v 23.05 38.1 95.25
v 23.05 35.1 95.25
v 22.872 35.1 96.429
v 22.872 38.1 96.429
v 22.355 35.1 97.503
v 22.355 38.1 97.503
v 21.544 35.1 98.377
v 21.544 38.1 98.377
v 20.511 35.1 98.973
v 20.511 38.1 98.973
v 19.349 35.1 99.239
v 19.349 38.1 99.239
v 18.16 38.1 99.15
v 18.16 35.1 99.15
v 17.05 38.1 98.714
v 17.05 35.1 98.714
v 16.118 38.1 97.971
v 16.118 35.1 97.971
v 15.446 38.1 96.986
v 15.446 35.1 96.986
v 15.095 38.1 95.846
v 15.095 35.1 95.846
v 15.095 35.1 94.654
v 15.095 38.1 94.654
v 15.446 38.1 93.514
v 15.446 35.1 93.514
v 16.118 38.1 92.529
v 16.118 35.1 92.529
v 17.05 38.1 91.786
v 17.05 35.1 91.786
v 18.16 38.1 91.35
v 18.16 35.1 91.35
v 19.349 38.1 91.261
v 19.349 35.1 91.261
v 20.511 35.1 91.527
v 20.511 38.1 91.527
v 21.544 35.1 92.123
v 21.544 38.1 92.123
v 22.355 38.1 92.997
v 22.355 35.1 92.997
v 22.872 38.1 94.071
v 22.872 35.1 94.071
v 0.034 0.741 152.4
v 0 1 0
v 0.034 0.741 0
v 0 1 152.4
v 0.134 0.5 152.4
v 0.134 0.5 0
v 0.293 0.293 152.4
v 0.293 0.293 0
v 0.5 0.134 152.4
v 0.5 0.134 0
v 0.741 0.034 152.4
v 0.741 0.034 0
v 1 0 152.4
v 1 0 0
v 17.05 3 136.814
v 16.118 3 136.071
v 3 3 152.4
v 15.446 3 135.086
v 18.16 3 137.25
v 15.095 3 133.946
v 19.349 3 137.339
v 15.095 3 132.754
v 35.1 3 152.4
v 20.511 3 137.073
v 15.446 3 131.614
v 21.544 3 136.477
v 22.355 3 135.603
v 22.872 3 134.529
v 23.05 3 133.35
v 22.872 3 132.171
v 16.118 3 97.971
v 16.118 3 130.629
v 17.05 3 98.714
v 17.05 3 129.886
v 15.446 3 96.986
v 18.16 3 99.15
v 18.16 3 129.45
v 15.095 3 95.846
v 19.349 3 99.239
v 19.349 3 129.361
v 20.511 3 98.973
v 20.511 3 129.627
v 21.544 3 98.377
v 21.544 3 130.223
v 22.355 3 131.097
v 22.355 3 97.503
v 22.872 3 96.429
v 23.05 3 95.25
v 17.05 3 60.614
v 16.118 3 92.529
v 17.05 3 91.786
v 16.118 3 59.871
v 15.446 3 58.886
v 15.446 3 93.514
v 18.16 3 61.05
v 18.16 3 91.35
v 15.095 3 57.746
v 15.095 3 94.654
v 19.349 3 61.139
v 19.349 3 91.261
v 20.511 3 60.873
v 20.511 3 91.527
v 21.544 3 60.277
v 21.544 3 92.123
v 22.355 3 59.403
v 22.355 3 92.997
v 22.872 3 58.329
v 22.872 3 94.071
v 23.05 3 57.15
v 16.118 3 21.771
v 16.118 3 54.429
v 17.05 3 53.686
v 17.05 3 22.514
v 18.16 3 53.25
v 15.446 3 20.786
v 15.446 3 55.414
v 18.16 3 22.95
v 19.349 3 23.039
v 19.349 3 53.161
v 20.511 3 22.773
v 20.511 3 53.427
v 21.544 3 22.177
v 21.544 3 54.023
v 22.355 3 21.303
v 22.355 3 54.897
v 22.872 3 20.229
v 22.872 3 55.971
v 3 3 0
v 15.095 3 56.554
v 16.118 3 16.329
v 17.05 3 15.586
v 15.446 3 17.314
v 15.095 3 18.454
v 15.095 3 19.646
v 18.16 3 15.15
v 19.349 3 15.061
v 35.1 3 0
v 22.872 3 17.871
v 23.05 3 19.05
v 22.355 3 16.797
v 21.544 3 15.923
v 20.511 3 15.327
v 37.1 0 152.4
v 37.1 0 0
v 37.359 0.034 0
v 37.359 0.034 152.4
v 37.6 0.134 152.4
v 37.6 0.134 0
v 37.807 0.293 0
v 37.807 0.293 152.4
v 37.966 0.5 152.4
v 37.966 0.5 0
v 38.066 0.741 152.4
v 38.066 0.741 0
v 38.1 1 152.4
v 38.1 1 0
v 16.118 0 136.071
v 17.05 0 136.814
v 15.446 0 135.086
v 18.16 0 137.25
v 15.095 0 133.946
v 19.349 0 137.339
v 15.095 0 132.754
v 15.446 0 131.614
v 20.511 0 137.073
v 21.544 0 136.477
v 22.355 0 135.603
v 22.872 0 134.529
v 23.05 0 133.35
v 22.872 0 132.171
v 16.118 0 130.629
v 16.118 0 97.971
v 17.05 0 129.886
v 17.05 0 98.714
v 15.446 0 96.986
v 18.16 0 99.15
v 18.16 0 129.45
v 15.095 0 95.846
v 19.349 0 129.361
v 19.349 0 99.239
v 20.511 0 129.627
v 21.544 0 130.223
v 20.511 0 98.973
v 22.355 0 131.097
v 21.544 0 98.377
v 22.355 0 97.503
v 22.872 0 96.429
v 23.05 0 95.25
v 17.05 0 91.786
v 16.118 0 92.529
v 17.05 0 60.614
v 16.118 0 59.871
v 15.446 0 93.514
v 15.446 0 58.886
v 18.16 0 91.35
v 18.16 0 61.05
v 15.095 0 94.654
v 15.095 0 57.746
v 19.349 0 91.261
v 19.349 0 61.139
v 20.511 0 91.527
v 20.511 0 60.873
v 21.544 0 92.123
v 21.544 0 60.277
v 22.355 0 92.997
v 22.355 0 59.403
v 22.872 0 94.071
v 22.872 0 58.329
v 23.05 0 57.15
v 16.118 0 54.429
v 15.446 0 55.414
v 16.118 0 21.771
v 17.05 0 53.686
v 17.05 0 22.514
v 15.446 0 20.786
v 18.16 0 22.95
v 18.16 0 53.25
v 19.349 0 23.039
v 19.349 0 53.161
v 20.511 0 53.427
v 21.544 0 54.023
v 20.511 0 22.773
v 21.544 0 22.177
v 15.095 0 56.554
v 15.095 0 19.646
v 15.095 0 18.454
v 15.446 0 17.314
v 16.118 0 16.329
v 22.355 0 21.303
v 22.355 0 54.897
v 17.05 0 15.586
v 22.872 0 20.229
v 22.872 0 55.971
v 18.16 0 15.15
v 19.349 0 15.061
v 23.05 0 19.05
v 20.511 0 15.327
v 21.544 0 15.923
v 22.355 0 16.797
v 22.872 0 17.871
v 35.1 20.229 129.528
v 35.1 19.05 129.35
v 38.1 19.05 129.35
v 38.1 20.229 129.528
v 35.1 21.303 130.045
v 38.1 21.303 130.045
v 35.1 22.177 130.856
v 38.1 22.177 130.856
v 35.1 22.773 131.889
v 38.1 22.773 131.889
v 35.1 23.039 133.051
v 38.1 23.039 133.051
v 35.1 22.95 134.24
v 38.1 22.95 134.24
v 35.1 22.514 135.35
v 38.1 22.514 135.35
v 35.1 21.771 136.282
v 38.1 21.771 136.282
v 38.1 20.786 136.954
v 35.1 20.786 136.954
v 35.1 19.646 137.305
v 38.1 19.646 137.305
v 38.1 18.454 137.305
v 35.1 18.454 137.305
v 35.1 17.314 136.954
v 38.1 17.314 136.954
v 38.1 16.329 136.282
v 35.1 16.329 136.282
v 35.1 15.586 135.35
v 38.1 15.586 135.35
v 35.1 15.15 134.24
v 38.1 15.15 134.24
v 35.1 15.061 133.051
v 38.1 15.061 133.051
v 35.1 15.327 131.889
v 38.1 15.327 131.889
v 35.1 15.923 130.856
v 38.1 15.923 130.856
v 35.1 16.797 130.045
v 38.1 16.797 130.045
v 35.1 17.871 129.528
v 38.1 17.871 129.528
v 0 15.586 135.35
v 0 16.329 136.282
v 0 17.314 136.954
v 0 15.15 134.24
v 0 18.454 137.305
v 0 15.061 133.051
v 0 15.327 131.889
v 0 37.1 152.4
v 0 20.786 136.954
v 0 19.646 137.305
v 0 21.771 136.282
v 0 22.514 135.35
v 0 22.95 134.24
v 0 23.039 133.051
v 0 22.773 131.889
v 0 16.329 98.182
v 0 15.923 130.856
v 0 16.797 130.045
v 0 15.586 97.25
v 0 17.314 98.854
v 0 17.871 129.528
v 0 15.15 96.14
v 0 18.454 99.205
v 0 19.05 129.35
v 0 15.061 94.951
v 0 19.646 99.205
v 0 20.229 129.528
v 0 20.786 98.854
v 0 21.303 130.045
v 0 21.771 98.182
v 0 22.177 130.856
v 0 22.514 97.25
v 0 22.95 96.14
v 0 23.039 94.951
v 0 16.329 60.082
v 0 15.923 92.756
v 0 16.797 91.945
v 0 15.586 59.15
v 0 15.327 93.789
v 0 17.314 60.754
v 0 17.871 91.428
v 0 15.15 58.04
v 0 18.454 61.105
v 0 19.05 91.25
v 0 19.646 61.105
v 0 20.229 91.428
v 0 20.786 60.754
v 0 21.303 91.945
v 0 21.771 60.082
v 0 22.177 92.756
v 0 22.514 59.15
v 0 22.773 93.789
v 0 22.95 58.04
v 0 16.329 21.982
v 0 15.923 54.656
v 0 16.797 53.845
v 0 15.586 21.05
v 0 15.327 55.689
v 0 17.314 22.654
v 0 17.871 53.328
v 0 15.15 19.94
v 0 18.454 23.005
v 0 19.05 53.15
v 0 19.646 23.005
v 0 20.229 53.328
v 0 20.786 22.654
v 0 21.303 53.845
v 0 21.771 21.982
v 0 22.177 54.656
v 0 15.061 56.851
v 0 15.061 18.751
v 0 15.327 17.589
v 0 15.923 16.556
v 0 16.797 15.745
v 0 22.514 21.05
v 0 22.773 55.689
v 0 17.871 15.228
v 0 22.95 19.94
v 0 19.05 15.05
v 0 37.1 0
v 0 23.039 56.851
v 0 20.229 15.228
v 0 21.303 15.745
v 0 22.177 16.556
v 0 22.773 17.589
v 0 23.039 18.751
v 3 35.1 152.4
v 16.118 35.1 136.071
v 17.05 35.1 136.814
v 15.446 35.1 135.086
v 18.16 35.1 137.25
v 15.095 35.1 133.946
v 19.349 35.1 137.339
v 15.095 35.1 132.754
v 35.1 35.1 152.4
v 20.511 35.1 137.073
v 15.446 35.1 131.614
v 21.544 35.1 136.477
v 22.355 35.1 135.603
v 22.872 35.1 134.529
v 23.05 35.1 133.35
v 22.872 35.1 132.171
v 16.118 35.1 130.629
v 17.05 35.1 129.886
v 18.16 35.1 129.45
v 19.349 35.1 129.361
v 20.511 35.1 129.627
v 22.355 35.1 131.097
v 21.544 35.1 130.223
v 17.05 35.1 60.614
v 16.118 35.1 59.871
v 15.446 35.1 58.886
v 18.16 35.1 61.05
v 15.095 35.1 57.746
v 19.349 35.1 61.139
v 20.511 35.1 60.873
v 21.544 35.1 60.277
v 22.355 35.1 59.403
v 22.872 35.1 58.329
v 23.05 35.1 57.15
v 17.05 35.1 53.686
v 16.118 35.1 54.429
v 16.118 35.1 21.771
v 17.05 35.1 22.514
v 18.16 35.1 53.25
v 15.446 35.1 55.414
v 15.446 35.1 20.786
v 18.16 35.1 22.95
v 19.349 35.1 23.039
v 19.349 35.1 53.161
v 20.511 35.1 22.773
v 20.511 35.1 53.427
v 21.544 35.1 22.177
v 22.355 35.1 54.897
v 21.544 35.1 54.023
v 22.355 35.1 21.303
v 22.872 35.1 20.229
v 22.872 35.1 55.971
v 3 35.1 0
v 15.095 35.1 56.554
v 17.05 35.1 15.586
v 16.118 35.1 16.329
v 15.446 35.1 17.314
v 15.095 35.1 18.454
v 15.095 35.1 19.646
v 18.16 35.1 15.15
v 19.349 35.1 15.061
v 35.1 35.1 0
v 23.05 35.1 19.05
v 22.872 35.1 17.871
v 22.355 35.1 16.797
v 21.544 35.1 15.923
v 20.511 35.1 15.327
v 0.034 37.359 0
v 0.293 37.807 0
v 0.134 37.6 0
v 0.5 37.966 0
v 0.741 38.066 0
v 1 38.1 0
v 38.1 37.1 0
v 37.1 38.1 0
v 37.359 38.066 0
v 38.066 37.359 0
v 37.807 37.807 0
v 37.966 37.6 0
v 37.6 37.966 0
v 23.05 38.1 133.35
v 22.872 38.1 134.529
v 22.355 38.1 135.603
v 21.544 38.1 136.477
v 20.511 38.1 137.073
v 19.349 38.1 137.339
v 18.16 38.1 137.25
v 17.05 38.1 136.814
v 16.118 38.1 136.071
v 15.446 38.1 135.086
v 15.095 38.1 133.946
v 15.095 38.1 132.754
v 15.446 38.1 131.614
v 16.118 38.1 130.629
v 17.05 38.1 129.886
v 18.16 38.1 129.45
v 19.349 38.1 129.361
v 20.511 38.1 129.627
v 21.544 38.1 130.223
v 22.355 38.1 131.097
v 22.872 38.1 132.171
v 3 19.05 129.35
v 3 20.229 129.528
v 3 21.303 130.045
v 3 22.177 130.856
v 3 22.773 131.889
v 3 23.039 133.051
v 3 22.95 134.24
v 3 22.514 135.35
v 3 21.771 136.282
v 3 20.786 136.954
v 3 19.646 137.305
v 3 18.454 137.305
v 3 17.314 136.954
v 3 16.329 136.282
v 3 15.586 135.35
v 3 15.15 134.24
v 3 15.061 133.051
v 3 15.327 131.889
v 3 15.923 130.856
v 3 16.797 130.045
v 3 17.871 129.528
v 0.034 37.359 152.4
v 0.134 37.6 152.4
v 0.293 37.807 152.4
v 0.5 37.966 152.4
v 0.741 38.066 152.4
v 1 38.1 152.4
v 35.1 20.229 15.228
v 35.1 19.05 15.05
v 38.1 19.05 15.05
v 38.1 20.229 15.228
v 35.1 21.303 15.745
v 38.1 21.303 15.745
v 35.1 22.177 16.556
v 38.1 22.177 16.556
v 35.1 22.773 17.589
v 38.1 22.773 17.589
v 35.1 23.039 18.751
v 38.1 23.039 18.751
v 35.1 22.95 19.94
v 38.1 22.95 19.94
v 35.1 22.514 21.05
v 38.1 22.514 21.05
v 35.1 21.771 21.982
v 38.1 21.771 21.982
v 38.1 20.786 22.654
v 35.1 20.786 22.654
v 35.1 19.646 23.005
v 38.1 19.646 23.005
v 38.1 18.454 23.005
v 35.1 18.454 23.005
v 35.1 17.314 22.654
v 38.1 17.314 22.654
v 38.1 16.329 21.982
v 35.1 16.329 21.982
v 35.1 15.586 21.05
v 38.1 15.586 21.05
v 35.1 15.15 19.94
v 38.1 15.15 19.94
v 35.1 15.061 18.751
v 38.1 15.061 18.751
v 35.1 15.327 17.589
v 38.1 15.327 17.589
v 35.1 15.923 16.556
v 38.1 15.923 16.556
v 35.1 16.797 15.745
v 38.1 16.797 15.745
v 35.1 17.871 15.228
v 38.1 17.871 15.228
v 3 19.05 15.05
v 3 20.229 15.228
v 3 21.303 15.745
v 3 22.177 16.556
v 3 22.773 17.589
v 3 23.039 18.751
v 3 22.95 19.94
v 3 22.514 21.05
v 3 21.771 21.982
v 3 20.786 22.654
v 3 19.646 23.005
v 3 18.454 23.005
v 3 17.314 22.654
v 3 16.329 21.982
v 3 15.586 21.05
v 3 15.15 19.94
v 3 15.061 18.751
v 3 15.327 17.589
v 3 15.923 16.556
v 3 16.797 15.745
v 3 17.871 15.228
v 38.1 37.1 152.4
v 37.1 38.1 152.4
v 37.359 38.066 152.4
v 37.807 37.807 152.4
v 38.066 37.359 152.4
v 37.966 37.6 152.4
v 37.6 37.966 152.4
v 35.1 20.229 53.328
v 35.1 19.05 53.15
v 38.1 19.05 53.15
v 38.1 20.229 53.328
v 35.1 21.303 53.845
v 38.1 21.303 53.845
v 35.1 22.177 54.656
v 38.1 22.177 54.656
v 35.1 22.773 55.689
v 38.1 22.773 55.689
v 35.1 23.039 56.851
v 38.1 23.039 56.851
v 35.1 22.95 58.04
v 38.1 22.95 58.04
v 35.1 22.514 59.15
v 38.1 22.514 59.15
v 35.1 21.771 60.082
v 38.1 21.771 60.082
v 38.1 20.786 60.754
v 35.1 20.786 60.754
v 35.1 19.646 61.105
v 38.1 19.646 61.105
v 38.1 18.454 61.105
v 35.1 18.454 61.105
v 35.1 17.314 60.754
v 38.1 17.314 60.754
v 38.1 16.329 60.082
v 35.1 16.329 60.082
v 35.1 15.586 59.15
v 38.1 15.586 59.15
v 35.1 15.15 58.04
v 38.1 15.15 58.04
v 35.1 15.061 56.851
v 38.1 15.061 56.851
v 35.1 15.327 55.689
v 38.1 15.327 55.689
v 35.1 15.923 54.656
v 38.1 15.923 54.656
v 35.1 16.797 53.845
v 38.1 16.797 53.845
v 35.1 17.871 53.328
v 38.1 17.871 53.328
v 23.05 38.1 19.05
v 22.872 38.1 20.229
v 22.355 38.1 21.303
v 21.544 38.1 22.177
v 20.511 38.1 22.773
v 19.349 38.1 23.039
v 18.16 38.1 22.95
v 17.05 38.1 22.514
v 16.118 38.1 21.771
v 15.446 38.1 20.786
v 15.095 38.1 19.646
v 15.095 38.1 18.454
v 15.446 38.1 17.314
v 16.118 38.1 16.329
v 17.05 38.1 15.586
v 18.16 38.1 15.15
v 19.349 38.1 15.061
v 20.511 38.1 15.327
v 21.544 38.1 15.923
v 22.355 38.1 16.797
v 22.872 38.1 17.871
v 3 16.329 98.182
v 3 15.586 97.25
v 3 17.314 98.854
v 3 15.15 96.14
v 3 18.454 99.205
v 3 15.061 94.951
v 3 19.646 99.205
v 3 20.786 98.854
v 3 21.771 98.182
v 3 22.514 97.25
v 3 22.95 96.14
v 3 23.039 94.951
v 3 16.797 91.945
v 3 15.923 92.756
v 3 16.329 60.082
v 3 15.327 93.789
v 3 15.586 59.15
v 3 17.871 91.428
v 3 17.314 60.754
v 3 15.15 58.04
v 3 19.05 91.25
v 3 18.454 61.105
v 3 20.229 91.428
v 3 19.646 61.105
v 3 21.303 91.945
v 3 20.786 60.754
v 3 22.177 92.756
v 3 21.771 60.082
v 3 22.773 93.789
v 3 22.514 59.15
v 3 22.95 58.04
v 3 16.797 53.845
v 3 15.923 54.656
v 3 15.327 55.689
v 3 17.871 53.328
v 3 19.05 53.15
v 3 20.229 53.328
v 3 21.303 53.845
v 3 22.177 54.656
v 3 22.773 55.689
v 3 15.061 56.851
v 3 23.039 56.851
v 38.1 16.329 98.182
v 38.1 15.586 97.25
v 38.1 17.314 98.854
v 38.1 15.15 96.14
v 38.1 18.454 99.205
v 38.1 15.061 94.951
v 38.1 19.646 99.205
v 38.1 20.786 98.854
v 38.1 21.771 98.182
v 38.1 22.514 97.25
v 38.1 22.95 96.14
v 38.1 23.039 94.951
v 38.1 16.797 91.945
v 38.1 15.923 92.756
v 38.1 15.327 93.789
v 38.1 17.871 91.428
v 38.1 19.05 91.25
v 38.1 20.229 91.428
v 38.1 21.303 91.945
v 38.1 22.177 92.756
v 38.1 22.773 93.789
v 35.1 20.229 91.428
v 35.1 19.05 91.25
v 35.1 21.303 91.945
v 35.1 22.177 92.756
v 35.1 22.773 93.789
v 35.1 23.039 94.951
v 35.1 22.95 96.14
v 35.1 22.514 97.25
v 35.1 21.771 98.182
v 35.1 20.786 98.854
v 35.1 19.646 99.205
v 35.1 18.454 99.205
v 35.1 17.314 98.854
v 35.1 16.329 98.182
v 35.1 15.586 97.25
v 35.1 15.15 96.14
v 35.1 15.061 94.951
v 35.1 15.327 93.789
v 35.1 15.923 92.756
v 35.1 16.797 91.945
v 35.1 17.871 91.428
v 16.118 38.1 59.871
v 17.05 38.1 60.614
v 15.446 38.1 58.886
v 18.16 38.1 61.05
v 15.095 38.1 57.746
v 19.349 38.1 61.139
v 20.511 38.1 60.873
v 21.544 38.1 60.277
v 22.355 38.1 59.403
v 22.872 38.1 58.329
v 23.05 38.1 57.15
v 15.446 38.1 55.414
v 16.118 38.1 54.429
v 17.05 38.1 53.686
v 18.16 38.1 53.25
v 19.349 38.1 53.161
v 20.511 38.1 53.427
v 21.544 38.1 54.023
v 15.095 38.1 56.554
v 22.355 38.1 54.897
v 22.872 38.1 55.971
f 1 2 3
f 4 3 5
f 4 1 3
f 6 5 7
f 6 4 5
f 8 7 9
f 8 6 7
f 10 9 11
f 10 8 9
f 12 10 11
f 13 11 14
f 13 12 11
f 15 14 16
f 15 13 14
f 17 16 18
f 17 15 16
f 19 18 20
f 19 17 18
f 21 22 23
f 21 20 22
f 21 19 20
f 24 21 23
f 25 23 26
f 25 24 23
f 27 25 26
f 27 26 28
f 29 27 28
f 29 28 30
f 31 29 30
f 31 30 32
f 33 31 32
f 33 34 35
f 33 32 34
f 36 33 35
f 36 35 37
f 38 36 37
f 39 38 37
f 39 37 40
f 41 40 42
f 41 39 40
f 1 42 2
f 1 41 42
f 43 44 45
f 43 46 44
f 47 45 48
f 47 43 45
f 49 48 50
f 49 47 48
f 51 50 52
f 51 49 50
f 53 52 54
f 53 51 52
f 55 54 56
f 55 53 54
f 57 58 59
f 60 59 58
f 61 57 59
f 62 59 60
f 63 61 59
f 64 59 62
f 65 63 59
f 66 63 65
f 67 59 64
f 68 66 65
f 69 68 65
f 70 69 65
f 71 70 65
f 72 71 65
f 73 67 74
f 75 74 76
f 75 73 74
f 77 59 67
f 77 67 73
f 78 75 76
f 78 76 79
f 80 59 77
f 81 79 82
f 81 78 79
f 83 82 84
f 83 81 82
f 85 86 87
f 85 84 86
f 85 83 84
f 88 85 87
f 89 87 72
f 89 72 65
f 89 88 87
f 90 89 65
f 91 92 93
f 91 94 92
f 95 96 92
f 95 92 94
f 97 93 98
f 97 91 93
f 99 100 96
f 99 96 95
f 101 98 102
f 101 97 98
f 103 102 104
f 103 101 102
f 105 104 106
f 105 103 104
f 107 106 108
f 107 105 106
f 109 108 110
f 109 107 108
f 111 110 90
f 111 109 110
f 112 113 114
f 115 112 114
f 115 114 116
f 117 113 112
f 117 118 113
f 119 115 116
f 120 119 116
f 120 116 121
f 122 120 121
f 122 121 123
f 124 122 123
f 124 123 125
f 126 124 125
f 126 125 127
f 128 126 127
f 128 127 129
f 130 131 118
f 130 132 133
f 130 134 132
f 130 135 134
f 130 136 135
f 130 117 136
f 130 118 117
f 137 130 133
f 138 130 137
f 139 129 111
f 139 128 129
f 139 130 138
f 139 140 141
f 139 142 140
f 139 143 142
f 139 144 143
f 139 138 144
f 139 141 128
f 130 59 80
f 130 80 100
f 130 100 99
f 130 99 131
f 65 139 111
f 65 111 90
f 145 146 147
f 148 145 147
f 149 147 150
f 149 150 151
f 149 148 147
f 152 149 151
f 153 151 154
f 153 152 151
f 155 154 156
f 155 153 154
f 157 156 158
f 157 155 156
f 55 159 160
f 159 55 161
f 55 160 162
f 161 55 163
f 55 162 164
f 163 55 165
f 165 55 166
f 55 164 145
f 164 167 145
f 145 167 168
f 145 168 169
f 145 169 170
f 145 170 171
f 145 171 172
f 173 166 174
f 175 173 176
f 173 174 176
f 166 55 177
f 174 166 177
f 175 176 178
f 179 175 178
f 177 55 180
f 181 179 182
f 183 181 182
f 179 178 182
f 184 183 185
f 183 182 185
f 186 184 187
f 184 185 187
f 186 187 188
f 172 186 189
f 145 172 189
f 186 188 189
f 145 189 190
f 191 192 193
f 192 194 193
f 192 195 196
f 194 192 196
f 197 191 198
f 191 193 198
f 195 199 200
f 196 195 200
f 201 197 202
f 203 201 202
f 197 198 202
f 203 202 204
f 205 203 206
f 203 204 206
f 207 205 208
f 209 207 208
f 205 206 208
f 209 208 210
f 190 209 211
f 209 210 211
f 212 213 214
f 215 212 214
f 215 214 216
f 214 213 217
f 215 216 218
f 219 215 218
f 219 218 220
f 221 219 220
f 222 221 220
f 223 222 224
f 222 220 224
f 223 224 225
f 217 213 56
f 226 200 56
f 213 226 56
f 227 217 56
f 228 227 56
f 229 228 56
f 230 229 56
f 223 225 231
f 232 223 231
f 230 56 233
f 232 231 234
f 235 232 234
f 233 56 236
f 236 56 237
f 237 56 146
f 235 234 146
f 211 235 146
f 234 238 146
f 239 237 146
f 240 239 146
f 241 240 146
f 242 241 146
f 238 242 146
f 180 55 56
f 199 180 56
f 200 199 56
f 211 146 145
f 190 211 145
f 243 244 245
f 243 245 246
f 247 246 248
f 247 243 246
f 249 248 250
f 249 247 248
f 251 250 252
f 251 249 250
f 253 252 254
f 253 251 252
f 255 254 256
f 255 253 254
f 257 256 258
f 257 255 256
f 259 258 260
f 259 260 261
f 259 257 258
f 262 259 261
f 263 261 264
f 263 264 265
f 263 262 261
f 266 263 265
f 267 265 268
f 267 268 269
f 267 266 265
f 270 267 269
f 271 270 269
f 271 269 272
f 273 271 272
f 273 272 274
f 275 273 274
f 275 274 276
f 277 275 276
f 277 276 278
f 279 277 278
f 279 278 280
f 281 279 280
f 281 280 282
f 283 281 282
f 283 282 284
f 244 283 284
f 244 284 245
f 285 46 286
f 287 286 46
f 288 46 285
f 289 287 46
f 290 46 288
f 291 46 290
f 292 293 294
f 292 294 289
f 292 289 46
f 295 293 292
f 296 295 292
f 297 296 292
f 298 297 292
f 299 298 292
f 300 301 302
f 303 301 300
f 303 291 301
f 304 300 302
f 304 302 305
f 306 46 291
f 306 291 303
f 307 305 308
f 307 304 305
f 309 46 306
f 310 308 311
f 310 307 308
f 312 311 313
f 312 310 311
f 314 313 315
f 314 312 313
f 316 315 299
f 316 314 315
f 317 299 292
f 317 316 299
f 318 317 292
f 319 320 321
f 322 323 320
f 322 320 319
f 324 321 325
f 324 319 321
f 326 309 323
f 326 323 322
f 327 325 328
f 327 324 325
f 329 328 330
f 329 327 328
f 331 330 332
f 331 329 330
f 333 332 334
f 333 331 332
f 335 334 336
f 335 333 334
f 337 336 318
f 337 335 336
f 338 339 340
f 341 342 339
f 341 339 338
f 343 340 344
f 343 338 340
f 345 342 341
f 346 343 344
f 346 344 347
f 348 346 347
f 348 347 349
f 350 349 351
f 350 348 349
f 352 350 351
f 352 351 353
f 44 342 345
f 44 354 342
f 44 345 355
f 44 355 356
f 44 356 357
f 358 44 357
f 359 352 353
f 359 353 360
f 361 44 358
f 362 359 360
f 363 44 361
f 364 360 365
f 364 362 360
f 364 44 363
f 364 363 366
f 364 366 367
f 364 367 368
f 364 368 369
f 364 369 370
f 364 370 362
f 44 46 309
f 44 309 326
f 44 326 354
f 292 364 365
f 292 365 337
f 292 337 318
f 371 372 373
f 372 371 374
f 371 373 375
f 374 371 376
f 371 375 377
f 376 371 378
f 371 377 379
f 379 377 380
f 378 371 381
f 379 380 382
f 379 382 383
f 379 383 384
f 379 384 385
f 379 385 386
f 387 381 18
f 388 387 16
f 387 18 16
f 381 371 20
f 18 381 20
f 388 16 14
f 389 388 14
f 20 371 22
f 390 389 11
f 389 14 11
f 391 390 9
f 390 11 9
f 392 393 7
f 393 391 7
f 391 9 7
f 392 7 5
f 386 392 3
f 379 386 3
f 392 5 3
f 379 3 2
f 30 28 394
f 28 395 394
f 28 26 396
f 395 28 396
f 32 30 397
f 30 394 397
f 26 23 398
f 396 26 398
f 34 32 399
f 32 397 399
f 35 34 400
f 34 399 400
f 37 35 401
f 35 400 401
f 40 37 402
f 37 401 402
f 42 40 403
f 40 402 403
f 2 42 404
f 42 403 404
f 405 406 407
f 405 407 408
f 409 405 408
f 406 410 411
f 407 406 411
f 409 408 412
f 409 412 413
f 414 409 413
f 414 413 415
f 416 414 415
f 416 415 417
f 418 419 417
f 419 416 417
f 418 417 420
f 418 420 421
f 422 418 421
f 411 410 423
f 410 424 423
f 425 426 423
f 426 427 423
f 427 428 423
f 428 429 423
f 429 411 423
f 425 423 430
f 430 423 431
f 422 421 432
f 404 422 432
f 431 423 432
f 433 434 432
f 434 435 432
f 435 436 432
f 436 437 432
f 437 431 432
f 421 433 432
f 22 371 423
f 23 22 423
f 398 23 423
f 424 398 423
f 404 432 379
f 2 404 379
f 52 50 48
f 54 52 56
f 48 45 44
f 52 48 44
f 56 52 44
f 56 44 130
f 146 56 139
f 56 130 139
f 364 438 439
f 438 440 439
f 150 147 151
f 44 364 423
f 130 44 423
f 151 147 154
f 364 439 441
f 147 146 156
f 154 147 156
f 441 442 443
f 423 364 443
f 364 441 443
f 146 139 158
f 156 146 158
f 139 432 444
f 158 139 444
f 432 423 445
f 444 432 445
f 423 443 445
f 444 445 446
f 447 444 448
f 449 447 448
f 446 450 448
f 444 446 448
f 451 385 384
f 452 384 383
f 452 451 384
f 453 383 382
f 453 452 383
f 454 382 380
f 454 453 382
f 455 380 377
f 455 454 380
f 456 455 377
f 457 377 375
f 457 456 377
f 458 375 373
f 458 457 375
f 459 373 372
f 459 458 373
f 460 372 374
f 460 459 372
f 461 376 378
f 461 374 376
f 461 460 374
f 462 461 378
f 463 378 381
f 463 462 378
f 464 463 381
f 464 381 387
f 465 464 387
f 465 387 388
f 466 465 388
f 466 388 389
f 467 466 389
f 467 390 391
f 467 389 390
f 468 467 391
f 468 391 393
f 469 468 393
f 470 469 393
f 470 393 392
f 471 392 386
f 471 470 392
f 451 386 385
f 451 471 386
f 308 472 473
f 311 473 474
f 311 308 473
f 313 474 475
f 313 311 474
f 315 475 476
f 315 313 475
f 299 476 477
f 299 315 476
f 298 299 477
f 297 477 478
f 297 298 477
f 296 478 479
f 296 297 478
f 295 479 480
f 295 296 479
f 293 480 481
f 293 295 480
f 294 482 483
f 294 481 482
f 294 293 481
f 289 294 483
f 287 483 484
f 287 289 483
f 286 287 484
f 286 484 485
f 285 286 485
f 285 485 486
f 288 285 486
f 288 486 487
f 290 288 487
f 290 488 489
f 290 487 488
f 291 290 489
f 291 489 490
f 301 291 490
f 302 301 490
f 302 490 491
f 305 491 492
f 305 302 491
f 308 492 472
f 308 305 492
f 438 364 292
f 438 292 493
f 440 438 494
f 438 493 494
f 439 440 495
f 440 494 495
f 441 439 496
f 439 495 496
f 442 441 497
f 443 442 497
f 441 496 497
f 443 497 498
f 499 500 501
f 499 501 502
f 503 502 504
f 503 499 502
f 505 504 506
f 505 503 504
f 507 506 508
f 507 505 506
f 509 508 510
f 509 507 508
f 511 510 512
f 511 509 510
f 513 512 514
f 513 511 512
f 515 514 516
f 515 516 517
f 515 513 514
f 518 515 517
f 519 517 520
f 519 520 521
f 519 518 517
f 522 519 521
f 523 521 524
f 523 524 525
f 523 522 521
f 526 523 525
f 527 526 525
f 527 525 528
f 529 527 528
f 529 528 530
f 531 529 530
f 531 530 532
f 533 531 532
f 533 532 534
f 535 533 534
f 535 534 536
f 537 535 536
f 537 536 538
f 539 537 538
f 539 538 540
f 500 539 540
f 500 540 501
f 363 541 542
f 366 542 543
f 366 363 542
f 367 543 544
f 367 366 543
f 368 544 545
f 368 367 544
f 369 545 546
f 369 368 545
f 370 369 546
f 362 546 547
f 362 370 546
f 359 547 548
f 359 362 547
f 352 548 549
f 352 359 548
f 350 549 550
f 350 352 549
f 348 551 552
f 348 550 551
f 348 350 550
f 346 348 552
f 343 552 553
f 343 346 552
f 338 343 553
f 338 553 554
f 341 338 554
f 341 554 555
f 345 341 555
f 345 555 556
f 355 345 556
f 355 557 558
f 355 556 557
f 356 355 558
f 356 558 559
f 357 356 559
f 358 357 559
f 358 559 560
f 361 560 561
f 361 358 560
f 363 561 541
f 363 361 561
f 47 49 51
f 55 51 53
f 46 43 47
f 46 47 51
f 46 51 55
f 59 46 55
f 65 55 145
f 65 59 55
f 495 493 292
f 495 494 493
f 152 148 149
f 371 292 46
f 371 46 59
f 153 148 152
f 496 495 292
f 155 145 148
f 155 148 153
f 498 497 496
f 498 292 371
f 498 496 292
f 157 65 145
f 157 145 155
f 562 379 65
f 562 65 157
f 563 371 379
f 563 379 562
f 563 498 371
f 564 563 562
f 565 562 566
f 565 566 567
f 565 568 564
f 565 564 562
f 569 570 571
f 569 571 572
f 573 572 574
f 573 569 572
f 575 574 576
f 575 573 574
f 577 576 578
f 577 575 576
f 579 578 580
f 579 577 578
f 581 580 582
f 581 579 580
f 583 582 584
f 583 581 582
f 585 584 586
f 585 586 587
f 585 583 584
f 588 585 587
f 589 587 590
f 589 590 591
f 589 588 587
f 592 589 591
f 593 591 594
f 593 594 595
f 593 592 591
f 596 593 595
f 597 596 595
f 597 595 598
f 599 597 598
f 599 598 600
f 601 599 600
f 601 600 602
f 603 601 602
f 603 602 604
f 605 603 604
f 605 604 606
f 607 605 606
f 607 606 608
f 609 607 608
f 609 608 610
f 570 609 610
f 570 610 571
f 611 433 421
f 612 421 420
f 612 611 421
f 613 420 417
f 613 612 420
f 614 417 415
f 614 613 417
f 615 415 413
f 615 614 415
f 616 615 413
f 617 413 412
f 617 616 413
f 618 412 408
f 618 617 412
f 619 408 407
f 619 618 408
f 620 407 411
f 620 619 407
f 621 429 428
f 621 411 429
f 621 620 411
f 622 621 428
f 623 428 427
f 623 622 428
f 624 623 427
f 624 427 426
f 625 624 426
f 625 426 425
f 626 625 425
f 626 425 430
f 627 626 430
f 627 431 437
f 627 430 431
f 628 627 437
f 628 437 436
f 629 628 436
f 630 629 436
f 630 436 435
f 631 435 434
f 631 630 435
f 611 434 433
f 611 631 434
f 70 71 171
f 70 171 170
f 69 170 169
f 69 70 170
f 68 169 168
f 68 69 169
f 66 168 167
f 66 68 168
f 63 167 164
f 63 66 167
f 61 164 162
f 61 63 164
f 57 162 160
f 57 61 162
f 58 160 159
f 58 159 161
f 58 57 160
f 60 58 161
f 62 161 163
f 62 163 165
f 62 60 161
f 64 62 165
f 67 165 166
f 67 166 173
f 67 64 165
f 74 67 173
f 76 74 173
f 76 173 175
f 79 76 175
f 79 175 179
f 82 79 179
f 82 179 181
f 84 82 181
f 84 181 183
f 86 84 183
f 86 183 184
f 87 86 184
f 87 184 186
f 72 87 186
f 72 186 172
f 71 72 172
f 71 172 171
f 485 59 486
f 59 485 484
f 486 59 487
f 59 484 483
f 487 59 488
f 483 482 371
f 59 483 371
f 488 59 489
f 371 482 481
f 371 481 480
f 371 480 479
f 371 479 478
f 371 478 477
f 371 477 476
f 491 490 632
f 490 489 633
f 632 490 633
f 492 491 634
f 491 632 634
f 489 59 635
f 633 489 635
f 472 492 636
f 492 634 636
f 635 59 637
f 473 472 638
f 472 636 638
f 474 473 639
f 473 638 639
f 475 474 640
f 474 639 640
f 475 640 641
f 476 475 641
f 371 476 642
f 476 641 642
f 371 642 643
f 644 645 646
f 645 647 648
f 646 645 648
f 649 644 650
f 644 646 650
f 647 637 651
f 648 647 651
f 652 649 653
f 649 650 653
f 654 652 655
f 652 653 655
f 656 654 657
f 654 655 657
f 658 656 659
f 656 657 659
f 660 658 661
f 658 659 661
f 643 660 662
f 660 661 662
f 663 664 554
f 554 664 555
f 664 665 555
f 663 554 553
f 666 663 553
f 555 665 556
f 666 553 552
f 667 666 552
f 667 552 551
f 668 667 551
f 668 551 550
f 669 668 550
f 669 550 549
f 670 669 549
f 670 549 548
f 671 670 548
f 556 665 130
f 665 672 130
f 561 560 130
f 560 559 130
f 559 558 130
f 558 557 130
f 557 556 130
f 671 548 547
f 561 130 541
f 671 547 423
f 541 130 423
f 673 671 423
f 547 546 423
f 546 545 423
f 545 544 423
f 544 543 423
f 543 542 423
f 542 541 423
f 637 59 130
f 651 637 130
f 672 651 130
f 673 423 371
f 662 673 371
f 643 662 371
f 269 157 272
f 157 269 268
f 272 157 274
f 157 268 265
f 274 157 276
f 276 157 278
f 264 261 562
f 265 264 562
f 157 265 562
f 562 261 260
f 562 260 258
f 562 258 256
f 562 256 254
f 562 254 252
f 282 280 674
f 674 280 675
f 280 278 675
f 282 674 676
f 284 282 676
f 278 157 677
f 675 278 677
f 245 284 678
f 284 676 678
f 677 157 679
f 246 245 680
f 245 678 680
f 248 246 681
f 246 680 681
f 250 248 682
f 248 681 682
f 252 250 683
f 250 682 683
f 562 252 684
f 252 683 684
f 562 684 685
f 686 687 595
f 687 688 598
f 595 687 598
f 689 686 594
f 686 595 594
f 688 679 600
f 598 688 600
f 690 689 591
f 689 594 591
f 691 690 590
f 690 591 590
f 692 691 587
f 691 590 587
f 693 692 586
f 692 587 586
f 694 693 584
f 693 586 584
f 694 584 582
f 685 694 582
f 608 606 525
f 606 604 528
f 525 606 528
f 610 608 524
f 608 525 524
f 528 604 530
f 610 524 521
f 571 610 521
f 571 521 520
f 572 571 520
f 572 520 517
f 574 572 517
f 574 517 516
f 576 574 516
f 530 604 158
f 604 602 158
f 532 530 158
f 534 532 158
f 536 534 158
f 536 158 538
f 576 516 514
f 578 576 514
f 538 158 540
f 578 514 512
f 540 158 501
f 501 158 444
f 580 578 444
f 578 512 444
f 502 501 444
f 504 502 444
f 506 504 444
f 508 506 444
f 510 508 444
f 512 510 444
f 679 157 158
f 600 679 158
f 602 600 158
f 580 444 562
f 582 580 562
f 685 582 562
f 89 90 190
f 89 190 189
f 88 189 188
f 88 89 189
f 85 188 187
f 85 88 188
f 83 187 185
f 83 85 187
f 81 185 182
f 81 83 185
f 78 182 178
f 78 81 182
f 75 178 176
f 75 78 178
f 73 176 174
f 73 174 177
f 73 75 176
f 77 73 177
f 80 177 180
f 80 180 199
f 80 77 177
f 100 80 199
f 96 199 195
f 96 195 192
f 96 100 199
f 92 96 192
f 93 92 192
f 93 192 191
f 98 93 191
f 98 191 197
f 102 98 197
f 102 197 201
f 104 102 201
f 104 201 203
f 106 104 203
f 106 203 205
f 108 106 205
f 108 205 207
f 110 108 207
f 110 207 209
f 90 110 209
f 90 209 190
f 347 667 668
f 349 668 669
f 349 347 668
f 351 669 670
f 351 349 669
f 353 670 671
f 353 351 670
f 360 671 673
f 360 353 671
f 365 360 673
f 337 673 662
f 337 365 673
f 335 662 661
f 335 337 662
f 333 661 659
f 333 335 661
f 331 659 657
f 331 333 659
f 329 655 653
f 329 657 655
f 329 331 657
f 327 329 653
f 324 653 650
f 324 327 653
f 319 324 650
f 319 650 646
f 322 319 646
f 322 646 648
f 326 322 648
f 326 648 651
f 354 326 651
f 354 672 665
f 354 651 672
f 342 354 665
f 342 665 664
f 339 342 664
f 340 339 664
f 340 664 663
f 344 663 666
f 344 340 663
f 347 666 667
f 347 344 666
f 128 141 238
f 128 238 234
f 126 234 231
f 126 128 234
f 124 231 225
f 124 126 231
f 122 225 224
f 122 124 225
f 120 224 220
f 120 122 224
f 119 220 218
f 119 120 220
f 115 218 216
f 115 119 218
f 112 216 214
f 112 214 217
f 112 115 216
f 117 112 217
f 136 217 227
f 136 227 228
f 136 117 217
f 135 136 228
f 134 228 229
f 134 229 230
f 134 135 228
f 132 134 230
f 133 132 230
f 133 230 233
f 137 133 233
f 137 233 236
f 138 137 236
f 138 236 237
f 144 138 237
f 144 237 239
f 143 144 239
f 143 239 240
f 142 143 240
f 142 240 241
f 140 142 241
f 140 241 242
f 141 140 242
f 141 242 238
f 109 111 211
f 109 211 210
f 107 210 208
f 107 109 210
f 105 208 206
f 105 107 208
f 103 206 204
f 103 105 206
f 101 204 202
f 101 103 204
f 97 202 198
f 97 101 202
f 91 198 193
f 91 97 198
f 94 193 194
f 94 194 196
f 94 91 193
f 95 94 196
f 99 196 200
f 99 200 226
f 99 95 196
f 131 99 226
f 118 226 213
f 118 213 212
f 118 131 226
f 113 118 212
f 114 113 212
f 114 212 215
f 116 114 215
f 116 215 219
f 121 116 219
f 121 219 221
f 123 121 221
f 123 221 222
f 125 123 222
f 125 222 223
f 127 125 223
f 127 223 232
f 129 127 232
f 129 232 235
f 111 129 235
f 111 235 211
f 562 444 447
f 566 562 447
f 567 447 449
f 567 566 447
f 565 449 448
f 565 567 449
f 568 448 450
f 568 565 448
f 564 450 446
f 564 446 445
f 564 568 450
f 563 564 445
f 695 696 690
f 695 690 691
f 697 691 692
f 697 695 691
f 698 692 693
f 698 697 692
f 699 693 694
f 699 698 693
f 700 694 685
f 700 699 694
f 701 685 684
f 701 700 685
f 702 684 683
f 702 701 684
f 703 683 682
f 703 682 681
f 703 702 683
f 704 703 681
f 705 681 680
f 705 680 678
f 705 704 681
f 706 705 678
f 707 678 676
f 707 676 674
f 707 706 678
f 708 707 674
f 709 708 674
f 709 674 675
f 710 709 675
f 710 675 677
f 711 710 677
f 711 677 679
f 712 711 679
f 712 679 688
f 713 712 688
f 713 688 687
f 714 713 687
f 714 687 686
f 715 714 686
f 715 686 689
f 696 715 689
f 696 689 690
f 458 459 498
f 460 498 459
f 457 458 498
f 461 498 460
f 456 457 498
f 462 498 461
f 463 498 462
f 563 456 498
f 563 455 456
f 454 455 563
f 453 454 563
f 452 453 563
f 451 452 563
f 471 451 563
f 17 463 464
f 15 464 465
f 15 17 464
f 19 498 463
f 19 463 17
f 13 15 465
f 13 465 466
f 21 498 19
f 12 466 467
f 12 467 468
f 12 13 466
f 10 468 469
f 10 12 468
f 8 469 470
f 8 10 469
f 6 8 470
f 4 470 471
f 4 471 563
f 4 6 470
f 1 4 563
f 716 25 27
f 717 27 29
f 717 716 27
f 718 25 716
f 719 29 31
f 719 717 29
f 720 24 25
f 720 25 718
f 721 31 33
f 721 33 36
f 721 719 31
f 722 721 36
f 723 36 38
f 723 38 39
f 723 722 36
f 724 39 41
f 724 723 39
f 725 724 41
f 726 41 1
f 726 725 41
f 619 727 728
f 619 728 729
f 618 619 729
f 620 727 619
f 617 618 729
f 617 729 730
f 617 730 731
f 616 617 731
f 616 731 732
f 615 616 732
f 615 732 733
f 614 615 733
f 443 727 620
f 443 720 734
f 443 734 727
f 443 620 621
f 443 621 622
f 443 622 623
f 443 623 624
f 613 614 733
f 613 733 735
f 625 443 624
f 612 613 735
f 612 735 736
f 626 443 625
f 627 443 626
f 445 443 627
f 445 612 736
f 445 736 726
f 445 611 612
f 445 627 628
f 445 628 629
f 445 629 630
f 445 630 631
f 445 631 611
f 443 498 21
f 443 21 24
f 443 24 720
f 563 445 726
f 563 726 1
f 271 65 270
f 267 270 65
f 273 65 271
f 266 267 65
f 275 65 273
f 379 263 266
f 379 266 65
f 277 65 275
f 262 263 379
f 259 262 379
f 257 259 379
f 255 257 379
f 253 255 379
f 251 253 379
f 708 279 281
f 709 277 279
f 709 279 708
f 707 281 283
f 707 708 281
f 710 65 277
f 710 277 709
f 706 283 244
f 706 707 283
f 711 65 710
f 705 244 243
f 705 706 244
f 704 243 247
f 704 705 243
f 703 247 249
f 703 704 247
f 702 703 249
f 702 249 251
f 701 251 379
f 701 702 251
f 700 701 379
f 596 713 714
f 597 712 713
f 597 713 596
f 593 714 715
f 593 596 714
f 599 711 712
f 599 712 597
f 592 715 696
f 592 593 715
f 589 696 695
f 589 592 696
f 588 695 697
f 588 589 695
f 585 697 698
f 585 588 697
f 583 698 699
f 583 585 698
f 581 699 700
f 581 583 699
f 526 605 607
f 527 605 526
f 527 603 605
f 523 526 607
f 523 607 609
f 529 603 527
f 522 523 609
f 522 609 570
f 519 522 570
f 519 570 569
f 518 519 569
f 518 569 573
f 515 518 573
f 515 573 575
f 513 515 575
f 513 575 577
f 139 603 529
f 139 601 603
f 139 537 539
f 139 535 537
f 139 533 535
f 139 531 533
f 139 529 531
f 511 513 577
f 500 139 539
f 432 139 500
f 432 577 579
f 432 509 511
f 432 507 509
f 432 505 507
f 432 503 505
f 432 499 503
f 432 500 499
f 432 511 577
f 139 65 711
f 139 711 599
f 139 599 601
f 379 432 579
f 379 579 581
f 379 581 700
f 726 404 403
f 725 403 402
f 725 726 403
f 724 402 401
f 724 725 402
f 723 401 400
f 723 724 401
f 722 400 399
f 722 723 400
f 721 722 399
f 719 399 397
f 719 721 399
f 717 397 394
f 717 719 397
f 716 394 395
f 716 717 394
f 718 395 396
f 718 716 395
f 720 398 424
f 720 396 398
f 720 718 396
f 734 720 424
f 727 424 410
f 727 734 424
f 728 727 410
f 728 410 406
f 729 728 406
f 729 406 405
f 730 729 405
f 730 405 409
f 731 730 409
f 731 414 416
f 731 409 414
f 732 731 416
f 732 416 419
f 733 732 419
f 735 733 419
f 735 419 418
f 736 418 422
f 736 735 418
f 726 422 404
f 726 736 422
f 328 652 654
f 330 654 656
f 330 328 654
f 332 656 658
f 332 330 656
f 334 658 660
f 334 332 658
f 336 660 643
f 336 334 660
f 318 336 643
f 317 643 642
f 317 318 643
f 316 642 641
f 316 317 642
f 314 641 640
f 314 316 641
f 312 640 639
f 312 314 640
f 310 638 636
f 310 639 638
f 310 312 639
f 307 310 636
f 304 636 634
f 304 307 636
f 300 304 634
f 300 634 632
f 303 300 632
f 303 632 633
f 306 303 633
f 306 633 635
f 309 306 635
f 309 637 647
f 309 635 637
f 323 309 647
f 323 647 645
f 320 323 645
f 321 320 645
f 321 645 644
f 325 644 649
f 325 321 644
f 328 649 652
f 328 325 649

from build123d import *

# Parameters (mm, degrees)
BOX001_W               = 32.1
BOX001_H               = 32.1
BOX001_DEPTH           = 152.4
CYLINDER_R             = 4
CYLINDER_DEPTH         = 38.1
CYLINDER_PITCH_ANGLE   = 90
ARRAY001_Z_COUNT       = 4
ARRAY001_Z_PITCH       = 38.1
CYLINDER001_R          = 4
CYLINDER001_DEPTH      = 38.1
CYLINDER001_ROLL_ANGLE = 90
ARRAY_Z_COUNT          = 4
ARRAY_Z_PITCH          = 38.1
BOX_W                  = 38.1
BOX_H                  = 38.1
BOX_DEPTH              = 152.4
FILLET_R               = 1


with BuildPart() as cutout:
    # Box001 → Box001 (new body)
    with BuildSketch(Plane(origin=(3, 3, 0), x_dir=(1, 0, 0), z_dir=(0, 0, 1))):
        with Locations((16.05, 16.05)):
            Rectangle(BOX001_W, BOX001_H)
    extrude(amount=BOX001_DEPTH)


with BuildPart() as holes2:
    # Cylinder → Cylinder (new body)
    with BuildSketch(Plane.XY):
        Circle(CYLINDER_R)
    extrude(amount=CYLINDER_DEPTH)


with BuildPart() as holes2_1:
    # Cylinder pitch: moved
    add(holes2.part.rotate(Axis((0, 0, 0), (0, 1, 0)), CYLINDER_PITCH_ANGLE))


with BuildPart() as holes2_2:
    # Cylinder placement: moved
    add(holes2_1.part.moved(Location((0, 19.05, 19.05))))

    # Array001 Z: Holes2 ×4


with BuildPart() as holes2_3:
    add(holes2_2.part)
    with Locations(*[(0, 0, i * ARRAY001_Z_PITCH) for i in range(1, ARRAY001_Z_COUNT)]):
        add(holes2_2.part)


with BuildPart() as holes1:
    # Cylinder001 → Cylinder001 (new body)
    with BuildSketch(Plane.XY):
        Circle(CYLINDER001_R)
    extrude(amount=CYLINDER001_DEPTH)


with BuildPart() as holes1_1:
    # Cylinder001 roll: moved
    add(holes1.part.rotate(Axis((0, 0, 0), (1, 0, 0)), CYLINDER001_ROLL_ANGLE))


with BuildPart() as holes1_2:
    # Cylinder001 placement: moved
    add(holes1_1.part.moved(Location((19.05, 38.1, 19.05))))

    # Array Z: Holes1 ×4


with BuildPart() as holes1_3:
    add(holes1_2.part)
    with Locations(*[(0, 0, i * ARRAY_Z_PITCH) for i in range(1, ARRAY_Z_COUNT)]):
        add(holes1_2.part)


with BuildPart() as cut002:
    # Box → Box (new body)
    with BuildSketch(Plane.XY):
        with Locations((19.05, 19.05)):
            Rectangle(BOX_W, BOX_H)
    extrude(amount=BOX_DEPTH)

    # Fillet
    fillet_edges = [cut002.edges().sort_by_distance(p)[0] for p in [
        (0, 0, 76.2),
        (38.1, 0, 76.2),
        (38.1, 38.1, 76.2),
        (0, 38.1, 76.2),
    ]]
    fillet(fillet_edges, radius=FILLET_R)

    # Cut: cut Holes1
    add(holes1_3.part, mode=Mode.SUBTRACT)

    # Cut001: cut Holes2
    add(holes2_3.part, mode=Mode.SUBTRACT)

    # Cut002: cut Cutout
    add(cutout.part, mode=Mode.SUBTRACT)


solid = cut002.part
